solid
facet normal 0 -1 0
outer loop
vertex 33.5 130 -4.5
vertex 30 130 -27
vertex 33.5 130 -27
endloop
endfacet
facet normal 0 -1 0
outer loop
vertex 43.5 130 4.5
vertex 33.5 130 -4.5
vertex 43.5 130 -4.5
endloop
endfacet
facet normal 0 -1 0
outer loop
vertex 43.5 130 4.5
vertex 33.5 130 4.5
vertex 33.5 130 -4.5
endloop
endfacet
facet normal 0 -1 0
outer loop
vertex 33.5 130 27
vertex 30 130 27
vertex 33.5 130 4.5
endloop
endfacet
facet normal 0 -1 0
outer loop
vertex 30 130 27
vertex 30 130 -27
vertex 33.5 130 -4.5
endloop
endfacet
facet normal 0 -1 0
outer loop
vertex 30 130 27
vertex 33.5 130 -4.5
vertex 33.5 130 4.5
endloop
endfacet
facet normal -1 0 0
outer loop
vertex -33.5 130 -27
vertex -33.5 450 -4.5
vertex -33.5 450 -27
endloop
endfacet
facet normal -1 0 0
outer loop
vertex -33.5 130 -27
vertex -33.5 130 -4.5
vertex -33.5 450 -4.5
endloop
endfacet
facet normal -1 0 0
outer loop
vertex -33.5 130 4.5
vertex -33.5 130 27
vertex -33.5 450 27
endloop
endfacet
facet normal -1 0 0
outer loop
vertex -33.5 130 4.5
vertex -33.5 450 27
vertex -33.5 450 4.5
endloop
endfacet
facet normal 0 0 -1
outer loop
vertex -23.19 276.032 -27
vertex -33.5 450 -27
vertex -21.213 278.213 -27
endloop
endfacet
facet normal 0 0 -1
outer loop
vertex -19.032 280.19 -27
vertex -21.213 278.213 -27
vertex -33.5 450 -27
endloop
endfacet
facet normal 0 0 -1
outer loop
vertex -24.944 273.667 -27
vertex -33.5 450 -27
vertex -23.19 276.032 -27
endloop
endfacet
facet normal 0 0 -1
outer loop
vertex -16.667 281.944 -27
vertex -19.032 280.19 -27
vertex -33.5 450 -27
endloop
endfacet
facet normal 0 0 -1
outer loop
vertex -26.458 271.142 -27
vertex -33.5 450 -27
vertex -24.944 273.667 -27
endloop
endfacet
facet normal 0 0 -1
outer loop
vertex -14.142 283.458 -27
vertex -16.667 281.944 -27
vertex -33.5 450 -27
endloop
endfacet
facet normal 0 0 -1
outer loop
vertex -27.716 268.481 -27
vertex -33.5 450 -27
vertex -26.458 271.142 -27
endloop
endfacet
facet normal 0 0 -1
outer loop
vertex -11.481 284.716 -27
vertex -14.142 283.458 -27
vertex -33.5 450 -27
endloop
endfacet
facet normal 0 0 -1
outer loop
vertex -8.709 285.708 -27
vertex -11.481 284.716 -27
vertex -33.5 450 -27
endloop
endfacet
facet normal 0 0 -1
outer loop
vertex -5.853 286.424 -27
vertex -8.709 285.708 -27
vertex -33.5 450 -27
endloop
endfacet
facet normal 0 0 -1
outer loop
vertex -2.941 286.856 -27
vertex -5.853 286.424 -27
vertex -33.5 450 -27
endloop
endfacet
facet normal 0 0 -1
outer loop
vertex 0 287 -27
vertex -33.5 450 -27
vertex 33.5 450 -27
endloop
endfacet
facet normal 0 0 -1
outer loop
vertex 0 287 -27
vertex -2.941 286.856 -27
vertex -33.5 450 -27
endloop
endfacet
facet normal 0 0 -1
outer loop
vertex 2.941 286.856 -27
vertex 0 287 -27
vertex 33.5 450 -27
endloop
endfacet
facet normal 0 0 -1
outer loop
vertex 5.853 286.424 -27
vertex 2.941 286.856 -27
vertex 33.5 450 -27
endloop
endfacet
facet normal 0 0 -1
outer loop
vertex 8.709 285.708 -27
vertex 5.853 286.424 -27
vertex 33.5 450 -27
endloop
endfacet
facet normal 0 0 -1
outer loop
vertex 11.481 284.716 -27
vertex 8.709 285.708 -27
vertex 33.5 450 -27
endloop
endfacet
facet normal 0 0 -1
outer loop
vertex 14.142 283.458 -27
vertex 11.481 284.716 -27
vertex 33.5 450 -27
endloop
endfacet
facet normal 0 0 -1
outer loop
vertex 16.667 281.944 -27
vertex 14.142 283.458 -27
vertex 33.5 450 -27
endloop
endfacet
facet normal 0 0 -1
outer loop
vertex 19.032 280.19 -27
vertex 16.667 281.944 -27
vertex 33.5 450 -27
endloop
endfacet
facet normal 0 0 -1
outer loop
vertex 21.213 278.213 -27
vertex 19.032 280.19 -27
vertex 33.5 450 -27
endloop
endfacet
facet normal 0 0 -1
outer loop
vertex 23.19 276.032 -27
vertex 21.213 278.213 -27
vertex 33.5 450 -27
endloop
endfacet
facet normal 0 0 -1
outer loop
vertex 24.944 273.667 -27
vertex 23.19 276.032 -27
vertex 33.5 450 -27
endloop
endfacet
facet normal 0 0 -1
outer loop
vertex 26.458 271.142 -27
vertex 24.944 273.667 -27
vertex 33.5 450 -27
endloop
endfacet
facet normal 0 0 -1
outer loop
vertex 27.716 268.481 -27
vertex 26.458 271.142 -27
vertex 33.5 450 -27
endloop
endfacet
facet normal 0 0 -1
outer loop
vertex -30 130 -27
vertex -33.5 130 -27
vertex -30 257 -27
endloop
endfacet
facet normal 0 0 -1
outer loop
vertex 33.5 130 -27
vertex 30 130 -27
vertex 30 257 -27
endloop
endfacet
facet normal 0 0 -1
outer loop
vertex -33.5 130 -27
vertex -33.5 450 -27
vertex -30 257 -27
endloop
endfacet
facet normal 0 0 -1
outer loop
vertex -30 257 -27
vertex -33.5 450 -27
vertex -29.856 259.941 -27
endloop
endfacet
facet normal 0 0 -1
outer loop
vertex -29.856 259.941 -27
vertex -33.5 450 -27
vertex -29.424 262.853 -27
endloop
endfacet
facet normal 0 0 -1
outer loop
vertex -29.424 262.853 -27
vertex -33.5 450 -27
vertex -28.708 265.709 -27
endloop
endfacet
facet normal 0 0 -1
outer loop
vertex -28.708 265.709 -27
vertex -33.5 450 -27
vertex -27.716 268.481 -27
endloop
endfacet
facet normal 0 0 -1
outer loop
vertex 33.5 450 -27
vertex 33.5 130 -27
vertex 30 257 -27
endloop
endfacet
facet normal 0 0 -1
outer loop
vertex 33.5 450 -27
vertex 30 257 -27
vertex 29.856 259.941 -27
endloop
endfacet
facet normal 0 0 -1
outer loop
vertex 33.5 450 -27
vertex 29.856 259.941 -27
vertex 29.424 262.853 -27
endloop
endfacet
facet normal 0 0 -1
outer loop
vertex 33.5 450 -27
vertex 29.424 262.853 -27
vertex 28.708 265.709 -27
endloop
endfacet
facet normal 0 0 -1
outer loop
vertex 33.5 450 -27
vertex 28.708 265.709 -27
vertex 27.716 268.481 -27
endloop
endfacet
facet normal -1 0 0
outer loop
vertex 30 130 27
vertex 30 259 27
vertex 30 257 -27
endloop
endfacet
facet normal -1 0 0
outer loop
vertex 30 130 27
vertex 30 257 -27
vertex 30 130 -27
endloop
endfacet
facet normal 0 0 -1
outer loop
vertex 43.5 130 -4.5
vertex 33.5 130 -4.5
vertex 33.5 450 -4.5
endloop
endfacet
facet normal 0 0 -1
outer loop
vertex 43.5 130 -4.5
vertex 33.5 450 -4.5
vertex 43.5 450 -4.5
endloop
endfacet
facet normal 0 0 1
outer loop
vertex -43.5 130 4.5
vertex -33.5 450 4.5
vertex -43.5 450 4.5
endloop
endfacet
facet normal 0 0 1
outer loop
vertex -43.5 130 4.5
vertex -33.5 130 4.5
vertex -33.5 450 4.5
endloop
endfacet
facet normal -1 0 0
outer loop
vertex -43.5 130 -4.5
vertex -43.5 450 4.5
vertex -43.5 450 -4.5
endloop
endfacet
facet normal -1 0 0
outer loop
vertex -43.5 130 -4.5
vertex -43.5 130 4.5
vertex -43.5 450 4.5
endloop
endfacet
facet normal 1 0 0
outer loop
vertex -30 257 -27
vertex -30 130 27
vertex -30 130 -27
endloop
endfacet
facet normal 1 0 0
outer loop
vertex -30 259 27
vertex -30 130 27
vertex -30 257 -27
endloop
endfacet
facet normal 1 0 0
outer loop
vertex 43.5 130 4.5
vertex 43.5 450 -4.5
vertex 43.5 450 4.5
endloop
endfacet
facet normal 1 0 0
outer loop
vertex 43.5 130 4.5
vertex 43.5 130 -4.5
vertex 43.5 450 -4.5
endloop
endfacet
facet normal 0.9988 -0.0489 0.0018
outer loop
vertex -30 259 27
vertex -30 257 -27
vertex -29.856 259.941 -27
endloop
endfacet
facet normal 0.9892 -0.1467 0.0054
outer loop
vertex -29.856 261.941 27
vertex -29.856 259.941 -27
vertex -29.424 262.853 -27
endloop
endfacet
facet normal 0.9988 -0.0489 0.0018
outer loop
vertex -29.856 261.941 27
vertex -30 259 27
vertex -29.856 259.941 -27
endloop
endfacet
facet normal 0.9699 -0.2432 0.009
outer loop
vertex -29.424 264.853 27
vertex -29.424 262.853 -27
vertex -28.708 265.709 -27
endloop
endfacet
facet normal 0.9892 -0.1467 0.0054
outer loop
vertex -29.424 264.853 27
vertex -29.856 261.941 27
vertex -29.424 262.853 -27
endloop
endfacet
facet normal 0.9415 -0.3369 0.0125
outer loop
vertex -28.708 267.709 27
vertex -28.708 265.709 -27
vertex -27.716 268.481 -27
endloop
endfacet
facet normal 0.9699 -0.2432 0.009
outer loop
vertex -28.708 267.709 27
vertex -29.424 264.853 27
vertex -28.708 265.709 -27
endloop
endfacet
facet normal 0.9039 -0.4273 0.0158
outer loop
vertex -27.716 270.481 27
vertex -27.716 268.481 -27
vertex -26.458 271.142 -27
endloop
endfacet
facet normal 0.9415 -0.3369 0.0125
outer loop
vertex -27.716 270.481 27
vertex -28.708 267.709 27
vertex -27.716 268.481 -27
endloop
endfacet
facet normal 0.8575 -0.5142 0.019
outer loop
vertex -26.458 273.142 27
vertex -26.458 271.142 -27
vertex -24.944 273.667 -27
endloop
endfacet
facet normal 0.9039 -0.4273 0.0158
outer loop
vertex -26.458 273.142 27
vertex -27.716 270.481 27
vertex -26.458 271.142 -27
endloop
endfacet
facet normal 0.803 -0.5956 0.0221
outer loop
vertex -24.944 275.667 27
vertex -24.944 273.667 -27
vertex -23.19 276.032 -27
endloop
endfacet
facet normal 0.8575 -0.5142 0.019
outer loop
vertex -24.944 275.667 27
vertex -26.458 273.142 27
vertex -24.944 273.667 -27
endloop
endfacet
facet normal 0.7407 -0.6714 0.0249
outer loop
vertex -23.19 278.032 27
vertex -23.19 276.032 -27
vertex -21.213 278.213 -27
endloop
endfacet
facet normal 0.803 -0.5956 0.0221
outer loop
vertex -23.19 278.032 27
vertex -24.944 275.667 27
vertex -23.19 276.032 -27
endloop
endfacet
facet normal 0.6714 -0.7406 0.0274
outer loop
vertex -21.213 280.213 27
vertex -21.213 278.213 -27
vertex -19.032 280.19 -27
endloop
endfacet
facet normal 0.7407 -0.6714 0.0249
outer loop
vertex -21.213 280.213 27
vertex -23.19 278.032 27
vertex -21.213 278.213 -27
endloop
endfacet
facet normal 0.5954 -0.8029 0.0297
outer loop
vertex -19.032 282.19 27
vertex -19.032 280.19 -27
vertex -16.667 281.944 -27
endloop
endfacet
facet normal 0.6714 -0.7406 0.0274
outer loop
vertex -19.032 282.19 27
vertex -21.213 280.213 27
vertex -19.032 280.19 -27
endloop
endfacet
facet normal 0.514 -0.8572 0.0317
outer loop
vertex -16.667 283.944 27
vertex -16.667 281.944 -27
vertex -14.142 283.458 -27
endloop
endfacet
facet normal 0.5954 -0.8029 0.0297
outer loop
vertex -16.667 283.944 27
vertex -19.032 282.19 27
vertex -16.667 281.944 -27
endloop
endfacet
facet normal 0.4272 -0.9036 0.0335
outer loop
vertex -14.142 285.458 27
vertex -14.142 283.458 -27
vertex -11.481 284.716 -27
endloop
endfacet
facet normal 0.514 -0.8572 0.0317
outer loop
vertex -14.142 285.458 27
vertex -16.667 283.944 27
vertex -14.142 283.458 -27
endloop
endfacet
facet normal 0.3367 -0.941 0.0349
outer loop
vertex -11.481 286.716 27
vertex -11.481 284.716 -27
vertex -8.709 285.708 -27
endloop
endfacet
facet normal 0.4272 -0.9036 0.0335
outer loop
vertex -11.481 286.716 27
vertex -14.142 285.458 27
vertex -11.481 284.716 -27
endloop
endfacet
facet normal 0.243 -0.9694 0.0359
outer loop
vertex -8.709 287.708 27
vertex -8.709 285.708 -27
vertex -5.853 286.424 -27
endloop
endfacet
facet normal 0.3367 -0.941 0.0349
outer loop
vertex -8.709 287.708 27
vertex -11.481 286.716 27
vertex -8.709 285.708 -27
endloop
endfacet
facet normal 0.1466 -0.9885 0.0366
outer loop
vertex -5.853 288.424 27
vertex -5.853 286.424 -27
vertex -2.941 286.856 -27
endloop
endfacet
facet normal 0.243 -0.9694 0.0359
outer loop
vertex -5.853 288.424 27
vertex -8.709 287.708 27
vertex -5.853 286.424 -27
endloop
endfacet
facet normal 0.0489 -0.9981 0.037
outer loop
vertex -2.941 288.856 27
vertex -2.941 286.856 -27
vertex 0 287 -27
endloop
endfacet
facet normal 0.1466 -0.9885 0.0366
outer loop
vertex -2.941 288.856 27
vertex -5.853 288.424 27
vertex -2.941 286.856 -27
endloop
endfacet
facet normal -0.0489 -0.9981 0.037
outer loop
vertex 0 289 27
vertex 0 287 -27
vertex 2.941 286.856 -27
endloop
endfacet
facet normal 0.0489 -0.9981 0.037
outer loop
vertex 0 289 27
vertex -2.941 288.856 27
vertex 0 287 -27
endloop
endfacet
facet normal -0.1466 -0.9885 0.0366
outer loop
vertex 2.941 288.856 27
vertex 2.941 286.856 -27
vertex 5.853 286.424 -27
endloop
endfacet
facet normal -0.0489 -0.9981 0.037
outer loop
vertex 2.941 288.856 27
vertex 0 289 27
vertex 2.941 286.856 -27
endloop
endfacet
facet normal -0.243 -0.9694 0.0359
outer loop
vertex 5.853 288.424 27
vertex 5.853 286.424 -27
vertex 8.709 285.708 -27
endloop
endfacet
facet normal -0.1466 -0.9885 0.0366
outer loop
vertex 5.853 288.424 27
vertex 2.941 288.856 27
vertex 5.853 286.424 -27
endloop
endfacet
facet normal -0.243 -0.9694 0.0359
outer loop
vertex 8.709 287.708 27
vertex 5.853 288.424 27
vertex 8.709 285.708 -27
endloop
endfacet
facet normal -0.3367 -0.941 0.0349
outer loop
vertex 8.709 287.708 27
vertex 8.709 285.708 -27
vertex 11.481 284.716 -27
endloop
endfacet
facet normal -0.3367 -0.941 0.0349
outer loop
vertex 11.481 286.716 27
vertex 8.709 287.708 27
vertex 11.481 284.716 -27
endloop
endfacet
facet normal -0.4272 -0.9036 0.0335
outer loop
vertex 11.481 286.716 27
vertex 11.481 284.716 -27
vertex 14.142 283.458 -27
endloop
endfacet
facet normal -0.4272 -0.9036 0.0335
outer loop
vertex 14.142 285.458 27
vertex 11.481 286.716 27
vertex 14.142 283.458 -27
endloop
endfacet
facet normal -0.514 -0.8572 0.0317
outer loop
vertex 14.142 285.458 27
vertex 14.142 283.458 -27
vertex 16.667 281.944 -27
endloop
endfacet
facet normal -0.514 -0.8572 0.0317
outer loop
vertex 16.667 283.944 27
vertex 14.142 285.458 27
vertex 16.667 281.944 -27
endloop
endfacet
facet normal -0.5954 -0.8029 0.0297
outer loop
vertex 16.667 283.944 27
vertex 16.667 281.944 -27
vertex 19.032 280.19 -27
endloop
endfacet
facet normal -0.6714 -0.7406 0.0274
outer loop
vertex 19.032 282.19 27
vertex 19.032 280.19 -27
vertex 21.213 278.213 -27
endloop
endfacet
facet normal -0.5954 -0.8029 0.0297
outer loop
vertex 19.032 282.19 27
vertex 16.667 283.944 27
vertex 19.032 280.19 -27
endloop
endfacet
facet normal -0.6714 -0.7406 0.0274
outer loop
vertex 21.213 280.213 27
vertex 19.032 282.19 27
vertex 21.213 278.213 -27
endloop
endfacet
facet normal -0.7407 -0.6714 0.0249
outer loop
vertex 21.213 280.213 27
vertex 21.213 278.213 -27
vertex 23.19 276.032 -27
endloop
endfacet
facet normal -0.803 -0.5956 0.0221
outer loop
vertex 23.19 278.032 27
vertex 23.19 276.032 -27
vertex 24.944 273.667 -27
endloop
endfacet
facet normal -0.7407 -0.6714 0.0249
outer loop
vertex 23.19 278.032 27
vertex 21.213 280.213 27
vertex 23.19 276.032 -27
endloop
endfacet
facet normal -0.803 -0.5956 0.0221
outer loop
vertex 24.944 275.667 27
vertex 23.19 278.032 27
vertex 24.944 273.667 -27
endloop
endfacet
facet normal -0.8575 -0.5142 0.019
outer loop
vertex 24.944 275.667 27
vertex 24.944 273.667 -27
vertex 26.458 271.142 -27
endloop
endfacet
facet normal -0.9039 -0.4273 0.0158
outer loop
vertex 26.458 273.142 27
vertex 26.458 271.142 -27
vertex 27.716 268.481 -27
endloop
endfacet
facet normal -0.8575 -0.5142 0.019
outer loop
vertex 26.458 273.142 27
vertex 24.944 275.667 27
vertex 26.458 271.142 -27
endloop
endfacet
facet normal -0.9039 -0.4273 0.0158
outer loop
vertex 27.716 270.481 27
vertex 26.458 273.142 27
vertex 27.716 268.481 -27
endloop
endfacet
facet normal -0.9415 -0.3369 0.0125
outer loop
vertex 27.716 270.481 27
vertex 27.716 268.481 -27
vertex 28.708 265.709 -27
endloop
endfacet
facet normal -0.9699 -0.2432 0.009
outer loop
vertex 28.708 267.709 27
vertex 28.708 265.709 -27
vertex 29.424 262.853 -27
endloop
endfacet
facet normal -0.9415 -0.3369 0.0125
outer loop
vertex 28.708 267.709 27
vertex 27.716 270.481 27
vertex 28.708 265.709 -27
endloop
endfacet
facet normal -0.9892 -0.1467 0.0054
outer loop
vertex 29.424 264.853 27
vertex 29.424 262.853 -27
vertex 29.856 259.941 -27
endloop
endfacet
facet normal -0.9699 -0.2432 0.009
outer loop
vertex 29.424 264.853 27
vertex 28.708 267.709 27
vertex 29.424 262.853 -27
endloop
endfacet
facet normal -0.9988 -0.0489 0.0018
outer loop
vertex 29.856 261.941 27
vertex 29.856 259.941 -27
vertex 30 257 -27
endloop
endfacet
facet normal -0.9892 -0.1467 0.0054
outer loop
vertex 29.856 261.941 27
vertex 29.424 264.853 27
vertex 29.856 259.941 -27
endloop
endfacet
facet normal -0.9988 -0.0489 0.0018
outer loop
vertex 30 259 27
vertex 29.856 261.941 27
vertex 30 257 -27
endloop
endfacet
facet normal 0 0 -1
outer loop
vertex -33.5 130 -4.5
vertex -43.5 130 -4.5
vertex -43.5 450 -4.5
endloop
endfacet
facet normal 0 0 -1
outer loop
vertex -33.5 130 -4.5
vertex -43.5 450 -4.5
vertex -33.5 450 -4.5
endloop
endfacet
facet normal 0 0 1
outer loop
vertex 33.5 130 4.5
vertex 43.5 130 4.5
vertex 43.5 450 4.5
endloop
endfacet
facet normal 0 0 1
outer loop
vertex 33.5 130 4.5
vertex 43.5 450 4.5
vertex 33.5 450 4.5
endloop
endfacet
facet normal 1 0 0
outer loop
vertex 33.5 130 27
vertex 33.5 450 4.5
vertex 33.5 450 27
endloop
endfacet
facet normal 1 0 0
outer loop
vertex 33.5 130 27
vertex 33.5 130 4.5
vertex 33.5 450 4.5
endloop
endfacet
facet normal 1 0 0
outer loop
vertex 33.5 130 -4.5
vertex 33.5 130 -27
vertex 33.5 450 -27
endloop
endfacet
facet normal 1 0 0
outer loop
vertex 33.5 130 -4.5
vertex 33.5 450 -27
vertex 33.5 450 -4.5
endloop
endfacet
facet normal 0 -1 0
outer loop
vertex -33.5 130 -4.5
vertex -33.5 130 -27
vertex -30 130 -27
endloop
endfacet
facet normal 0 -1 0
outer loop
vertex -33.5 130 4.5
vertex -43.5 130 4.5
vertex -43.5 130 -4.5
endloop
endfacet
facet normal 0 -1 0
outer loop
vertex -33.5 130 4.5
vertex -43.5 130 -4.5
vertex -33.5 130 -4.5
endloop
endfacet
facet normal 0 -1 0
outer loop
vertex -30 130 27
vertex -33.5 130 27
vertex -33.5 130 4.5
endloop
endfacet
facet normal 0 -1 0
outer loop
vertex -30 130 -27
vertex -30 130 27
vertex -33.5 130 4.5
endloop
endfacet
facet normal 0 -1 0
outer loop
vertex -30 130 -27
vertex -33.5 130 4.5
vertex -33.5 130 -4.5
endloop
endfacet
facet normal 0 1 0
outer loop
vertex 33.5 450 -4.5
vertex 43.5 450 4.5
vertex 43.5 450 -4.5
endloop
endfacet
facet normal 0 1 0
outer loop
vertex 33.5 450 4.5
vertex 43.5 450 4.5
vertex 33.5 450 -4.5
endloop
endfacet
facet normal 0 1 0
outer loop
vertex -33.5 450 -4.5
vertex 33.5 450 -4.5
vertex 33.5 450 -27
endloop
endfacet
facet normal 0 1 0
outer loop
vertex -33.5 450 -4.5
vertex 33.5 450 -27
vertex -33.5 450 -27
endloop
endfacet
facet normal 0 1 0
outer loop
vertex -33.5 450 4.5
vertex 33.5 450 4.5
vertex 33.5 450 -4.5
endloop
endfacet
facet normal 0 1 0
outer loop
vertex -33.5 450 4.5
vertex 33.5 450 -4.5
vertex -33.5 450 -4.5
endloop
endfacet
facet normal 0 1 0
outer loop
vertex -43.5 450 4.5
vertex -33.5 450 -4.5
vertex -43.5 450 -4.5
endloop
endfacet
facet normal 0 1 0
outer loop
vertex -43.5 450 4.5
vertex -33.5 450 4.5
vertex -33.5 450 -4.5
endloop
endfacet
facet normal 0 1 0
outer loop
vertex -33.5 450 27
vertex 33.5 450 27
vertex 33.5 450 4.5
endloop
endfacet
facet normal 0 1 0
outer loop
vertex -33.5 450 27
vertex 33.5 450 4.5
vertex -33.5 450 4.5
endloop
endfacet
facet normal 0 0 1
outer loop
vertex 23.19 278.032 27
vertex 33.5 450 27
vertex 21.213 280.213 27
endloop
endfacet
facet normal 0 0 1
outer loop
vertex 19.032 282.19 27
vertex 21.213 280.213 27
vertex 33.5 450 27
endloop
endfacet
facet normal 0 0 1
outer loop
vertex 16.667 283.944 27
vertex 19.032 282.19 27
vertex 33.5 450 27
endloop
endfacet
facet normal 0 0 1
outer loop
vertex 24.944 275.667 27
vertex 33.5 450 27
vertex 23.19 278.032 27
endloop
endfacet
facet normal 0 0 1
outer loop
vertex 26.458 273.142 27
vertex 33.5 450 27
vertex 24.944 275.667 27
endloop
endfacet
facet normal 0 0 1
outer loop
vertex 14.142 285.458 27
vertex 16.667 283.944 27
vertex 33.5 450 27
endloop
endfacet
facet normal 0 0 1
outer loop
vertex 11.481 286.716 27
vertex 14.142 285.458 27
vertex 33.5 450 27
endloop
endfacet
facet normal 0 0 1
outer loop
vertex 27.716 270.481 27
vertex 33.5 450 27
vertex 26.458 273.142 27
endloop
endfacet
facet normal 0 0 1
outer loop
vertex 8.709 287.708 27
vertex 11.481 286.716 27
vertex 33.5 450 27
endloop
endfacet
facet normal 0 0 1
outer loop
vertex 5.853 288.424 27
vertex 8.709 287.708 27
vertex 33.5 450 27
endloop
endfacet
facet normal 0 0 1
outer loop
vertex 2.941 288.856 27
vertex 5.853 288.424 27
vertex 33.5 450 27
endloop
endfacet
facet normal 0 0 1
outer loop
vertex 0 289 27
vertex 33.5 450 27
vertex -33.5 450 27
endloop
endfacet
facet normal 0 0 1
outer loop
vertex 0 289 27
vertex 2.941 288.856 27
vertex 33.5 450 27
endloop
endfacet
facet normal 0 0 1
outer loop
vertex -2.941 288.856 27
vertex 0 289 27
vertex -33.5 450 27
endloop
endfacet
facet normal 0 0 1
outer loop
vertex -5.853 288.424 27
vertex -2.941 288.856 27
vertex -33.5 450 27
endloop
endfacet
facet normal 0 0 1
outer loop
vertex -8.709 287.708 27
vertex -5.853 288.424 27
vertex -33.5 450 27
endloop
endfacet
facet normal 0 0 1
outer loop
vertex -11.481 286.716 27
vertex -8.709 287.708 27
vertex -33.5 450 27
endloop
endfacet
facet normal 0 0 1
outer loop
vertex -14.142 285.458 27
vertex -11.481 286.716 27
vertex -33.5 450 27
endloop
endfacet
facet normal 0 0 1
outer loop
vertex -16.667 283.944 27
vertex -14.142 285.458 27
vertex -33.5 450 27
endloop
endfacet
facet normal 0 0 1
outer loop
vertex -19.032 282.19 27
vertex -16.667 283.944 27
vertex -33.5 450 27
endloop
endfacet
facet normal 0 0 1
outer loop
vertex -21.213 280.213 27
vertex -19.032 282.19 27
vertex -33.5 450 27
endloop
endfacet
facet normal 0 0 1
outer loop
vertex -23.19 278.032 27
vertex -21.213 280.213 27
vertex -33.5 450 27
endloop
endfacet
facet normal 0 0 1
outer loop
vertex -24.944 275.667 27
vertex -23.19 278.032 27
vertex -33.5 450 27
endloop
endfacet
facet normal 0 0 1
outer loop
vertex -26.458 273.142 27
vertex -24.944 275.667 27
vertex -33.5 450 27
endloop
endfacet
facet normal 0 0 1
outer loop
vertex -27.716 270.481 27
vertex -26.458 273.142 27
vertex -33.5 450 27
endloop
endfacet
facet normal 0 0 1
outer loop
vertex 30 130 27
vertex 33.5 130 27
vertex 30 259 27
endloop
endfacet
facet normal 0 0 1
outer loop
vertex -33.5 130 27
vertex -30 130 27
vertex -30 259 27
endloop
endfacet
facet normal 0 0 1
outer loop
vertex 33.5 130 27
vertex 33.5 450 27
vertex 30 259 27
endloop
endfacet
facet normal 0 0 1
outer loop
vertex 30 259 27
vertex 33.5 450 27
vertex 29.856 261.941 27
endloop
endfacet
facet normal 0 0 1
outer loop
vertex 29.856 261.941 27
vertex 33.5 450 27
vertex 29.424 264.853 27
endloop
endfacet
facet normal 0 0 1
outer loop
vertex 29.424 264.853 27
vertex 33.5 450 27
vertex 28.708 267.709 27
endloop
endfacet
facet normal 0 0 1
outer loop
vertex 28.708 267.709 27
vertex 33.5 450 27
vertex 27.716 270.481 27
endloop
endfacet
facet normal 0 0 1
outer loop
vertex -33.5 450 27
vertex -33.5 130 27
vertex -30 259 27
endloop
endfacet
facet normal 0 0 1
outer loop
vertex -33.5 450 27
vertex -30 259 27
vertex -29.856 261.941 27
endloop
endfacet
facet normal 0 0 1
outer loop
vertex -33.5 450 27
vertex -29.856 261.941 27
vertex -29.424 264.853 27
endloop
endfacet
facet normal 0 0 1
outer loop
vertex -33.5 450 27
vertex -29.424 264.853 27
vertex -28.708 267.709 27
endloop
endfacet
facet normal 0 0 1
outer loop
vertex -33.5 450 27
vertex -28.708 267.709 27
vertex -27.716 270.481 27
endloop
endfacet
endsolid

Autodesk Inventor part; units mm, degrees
ref_plane "YZ Plane" through (0, 0, 0) normal (1, 0, 0) x (0, 1, 0)
ref_plane "XZ Plane" through (0, 0, 0) normal (0, 1, 0) x (-1, 0, 0)
ref_plane "XY Plane" through (0, 0, 0) normal (0, 0, 1) x (1, 0, 0)
sketch "草圖1" plane through (0, 0, 0) normal (0, 1, 0) x (-1, 0, 0)
  line L0 (-33.5, 27) -> (33.5, 27)
  line L1 (33.5, 27) -> (33.5, -27)
  line L2 (33.5, -27) -> (-33.5, -27)
  line L3 (-33.5, -27) -> (-33.5, 27)
  line L4 (-33.5, 27) -> (33.5, -27) construction
  line L5 (33.5, 27) -> (-33.5, -27) construction
  line L6 (43.5, -4.5) -> (33.5, -4.5)
  line L7 (33.5, -4.5) -> (33.5, 4.5)
  line L8 (33.5, 4.5) -> (43.5, 4.5)
  line L9 (43.5, 4.5) -> (43.5, -4.5)
  line L10 (-33.5, -4.5) -> (-43.5, -4.5)
  line L11 (-43.5, -4.5) -> (-43.5, 4.5)
  line L12 (-43.5, 4.5) -> (-33.5, 4.5)
  line L13 (-33.5, 4.5) -> (-33.5, -4.5)
  point P0 (0, 0)
  point P1 (33.5, 0)
  point P2 (-33.5, 0)
  point P3 (-33.5, 4.5)
  point P4 (-33.5, -4.5)
  dimension "d0" = 67
  dimension "d1" = 54
  dimension "d2" = 9
  dimension "d3" = 10
extrude "擠出1" add sketch "草圖1" along normal blind 450
sketch "草圖2" plane through (-33.5, 0, 27) normal (0, 0, 1) x (1, 0, 0)
  line L0 (0, 0) -> (0, 450) projected
  line L1 (0, 450) -> (67, 450) projected
  line L2 (67, 450) -> (67, 0) projected
  line L3 (67, 0) -> (0, 0) projected
  circle A0 centre (33.5, 225) radius 30
  line L4 (3.5, 225) -> (63.5, 225)
  line L5 (63.5, 225) -> (63.5, -27.0162)
  line L6 (63.5, -27.0162) -> (3.5, -27.0162)
  line L7 (3.5, -27.0162) -> (3.5, 225)
  point P0 (33.5, 0)
  point P1 (33.5, 0)
  point P2 (63.5, 225)
  point P3 (3.5, 225)
  dimension "d6" = 225
  dimension "d7" = 60
extrude "擠出2" cut sketch "草圖2" against normal through all contours L7 A0 L5 L3 | L3 L5 L6 L7 | L4 A0 | A0 L4
sketch "草圖3" plane through (-33.5, 450, 27) normal (0, 0, 1) x (1, 0, 0)
  line L0 (-76.6135, -320) -> (143.6135, -320)
  line L1 (143.6135, -320) -> (143.6135, -450)
  line L2 (143.6135, -450) -> (-76.6135, -450)
  line L3 (-76.6135, -450) -> (-76.6135, -320)
  point P0 (33.5, -450)
  point P1 (33.5, -450)
  dimension "d10" = 130
extrude "擠出3" cut sketch "草圖3" against normal through all
sketch "草圖4" plane through (33.5, 450, -27) normal (0, 0, -1) x (-1, 0, 0)
  arc A0 (63.5, -225) -> (3.5, -225) centre (33.5, -225) ccw construction
  circle A1 centre (33.5, -193) radius 30
  line L0 (63.5, -320) -> (3.5, -320)
  line L1 (3.5, -320) -> (3.5, -193)
  line L2 (3.5, -193) -> (63.5, -193)
  line L3 (63.5, -193) -> (63.5, -320)
  point P0 (33.5, -450)
  point P1 (63.5, -320)
  dimension "d13" = 32
  dimension "d14" = 60
sketch "草圖5" plane through (-33.5, 450, 27) normal (0, 0, 1) x (1, 0, 0)
  circle A0 centre (33.5, -191) radius 30
  arc A1 (63.5, -225) -> (3.5, -225) centre (33.5, -225) ccw construction
  line L0 (63.5, -320) -> (3.5, -320)
  line L1 (3.5, -320) -> (3.5, -191)
  line L2 (3.5, -191) -> (63.5, -191)
  line L3 (63.5, -191) -> (63.5, -320)
  point P0 (33.5, -450)
  point P1 (63.5, -320)
  dimension "d15" = 34
  dimension "d16" = 60
loft "斷面混成1" cut profiles "草圖4", "草圖5"
properties part number "Slider-9"
